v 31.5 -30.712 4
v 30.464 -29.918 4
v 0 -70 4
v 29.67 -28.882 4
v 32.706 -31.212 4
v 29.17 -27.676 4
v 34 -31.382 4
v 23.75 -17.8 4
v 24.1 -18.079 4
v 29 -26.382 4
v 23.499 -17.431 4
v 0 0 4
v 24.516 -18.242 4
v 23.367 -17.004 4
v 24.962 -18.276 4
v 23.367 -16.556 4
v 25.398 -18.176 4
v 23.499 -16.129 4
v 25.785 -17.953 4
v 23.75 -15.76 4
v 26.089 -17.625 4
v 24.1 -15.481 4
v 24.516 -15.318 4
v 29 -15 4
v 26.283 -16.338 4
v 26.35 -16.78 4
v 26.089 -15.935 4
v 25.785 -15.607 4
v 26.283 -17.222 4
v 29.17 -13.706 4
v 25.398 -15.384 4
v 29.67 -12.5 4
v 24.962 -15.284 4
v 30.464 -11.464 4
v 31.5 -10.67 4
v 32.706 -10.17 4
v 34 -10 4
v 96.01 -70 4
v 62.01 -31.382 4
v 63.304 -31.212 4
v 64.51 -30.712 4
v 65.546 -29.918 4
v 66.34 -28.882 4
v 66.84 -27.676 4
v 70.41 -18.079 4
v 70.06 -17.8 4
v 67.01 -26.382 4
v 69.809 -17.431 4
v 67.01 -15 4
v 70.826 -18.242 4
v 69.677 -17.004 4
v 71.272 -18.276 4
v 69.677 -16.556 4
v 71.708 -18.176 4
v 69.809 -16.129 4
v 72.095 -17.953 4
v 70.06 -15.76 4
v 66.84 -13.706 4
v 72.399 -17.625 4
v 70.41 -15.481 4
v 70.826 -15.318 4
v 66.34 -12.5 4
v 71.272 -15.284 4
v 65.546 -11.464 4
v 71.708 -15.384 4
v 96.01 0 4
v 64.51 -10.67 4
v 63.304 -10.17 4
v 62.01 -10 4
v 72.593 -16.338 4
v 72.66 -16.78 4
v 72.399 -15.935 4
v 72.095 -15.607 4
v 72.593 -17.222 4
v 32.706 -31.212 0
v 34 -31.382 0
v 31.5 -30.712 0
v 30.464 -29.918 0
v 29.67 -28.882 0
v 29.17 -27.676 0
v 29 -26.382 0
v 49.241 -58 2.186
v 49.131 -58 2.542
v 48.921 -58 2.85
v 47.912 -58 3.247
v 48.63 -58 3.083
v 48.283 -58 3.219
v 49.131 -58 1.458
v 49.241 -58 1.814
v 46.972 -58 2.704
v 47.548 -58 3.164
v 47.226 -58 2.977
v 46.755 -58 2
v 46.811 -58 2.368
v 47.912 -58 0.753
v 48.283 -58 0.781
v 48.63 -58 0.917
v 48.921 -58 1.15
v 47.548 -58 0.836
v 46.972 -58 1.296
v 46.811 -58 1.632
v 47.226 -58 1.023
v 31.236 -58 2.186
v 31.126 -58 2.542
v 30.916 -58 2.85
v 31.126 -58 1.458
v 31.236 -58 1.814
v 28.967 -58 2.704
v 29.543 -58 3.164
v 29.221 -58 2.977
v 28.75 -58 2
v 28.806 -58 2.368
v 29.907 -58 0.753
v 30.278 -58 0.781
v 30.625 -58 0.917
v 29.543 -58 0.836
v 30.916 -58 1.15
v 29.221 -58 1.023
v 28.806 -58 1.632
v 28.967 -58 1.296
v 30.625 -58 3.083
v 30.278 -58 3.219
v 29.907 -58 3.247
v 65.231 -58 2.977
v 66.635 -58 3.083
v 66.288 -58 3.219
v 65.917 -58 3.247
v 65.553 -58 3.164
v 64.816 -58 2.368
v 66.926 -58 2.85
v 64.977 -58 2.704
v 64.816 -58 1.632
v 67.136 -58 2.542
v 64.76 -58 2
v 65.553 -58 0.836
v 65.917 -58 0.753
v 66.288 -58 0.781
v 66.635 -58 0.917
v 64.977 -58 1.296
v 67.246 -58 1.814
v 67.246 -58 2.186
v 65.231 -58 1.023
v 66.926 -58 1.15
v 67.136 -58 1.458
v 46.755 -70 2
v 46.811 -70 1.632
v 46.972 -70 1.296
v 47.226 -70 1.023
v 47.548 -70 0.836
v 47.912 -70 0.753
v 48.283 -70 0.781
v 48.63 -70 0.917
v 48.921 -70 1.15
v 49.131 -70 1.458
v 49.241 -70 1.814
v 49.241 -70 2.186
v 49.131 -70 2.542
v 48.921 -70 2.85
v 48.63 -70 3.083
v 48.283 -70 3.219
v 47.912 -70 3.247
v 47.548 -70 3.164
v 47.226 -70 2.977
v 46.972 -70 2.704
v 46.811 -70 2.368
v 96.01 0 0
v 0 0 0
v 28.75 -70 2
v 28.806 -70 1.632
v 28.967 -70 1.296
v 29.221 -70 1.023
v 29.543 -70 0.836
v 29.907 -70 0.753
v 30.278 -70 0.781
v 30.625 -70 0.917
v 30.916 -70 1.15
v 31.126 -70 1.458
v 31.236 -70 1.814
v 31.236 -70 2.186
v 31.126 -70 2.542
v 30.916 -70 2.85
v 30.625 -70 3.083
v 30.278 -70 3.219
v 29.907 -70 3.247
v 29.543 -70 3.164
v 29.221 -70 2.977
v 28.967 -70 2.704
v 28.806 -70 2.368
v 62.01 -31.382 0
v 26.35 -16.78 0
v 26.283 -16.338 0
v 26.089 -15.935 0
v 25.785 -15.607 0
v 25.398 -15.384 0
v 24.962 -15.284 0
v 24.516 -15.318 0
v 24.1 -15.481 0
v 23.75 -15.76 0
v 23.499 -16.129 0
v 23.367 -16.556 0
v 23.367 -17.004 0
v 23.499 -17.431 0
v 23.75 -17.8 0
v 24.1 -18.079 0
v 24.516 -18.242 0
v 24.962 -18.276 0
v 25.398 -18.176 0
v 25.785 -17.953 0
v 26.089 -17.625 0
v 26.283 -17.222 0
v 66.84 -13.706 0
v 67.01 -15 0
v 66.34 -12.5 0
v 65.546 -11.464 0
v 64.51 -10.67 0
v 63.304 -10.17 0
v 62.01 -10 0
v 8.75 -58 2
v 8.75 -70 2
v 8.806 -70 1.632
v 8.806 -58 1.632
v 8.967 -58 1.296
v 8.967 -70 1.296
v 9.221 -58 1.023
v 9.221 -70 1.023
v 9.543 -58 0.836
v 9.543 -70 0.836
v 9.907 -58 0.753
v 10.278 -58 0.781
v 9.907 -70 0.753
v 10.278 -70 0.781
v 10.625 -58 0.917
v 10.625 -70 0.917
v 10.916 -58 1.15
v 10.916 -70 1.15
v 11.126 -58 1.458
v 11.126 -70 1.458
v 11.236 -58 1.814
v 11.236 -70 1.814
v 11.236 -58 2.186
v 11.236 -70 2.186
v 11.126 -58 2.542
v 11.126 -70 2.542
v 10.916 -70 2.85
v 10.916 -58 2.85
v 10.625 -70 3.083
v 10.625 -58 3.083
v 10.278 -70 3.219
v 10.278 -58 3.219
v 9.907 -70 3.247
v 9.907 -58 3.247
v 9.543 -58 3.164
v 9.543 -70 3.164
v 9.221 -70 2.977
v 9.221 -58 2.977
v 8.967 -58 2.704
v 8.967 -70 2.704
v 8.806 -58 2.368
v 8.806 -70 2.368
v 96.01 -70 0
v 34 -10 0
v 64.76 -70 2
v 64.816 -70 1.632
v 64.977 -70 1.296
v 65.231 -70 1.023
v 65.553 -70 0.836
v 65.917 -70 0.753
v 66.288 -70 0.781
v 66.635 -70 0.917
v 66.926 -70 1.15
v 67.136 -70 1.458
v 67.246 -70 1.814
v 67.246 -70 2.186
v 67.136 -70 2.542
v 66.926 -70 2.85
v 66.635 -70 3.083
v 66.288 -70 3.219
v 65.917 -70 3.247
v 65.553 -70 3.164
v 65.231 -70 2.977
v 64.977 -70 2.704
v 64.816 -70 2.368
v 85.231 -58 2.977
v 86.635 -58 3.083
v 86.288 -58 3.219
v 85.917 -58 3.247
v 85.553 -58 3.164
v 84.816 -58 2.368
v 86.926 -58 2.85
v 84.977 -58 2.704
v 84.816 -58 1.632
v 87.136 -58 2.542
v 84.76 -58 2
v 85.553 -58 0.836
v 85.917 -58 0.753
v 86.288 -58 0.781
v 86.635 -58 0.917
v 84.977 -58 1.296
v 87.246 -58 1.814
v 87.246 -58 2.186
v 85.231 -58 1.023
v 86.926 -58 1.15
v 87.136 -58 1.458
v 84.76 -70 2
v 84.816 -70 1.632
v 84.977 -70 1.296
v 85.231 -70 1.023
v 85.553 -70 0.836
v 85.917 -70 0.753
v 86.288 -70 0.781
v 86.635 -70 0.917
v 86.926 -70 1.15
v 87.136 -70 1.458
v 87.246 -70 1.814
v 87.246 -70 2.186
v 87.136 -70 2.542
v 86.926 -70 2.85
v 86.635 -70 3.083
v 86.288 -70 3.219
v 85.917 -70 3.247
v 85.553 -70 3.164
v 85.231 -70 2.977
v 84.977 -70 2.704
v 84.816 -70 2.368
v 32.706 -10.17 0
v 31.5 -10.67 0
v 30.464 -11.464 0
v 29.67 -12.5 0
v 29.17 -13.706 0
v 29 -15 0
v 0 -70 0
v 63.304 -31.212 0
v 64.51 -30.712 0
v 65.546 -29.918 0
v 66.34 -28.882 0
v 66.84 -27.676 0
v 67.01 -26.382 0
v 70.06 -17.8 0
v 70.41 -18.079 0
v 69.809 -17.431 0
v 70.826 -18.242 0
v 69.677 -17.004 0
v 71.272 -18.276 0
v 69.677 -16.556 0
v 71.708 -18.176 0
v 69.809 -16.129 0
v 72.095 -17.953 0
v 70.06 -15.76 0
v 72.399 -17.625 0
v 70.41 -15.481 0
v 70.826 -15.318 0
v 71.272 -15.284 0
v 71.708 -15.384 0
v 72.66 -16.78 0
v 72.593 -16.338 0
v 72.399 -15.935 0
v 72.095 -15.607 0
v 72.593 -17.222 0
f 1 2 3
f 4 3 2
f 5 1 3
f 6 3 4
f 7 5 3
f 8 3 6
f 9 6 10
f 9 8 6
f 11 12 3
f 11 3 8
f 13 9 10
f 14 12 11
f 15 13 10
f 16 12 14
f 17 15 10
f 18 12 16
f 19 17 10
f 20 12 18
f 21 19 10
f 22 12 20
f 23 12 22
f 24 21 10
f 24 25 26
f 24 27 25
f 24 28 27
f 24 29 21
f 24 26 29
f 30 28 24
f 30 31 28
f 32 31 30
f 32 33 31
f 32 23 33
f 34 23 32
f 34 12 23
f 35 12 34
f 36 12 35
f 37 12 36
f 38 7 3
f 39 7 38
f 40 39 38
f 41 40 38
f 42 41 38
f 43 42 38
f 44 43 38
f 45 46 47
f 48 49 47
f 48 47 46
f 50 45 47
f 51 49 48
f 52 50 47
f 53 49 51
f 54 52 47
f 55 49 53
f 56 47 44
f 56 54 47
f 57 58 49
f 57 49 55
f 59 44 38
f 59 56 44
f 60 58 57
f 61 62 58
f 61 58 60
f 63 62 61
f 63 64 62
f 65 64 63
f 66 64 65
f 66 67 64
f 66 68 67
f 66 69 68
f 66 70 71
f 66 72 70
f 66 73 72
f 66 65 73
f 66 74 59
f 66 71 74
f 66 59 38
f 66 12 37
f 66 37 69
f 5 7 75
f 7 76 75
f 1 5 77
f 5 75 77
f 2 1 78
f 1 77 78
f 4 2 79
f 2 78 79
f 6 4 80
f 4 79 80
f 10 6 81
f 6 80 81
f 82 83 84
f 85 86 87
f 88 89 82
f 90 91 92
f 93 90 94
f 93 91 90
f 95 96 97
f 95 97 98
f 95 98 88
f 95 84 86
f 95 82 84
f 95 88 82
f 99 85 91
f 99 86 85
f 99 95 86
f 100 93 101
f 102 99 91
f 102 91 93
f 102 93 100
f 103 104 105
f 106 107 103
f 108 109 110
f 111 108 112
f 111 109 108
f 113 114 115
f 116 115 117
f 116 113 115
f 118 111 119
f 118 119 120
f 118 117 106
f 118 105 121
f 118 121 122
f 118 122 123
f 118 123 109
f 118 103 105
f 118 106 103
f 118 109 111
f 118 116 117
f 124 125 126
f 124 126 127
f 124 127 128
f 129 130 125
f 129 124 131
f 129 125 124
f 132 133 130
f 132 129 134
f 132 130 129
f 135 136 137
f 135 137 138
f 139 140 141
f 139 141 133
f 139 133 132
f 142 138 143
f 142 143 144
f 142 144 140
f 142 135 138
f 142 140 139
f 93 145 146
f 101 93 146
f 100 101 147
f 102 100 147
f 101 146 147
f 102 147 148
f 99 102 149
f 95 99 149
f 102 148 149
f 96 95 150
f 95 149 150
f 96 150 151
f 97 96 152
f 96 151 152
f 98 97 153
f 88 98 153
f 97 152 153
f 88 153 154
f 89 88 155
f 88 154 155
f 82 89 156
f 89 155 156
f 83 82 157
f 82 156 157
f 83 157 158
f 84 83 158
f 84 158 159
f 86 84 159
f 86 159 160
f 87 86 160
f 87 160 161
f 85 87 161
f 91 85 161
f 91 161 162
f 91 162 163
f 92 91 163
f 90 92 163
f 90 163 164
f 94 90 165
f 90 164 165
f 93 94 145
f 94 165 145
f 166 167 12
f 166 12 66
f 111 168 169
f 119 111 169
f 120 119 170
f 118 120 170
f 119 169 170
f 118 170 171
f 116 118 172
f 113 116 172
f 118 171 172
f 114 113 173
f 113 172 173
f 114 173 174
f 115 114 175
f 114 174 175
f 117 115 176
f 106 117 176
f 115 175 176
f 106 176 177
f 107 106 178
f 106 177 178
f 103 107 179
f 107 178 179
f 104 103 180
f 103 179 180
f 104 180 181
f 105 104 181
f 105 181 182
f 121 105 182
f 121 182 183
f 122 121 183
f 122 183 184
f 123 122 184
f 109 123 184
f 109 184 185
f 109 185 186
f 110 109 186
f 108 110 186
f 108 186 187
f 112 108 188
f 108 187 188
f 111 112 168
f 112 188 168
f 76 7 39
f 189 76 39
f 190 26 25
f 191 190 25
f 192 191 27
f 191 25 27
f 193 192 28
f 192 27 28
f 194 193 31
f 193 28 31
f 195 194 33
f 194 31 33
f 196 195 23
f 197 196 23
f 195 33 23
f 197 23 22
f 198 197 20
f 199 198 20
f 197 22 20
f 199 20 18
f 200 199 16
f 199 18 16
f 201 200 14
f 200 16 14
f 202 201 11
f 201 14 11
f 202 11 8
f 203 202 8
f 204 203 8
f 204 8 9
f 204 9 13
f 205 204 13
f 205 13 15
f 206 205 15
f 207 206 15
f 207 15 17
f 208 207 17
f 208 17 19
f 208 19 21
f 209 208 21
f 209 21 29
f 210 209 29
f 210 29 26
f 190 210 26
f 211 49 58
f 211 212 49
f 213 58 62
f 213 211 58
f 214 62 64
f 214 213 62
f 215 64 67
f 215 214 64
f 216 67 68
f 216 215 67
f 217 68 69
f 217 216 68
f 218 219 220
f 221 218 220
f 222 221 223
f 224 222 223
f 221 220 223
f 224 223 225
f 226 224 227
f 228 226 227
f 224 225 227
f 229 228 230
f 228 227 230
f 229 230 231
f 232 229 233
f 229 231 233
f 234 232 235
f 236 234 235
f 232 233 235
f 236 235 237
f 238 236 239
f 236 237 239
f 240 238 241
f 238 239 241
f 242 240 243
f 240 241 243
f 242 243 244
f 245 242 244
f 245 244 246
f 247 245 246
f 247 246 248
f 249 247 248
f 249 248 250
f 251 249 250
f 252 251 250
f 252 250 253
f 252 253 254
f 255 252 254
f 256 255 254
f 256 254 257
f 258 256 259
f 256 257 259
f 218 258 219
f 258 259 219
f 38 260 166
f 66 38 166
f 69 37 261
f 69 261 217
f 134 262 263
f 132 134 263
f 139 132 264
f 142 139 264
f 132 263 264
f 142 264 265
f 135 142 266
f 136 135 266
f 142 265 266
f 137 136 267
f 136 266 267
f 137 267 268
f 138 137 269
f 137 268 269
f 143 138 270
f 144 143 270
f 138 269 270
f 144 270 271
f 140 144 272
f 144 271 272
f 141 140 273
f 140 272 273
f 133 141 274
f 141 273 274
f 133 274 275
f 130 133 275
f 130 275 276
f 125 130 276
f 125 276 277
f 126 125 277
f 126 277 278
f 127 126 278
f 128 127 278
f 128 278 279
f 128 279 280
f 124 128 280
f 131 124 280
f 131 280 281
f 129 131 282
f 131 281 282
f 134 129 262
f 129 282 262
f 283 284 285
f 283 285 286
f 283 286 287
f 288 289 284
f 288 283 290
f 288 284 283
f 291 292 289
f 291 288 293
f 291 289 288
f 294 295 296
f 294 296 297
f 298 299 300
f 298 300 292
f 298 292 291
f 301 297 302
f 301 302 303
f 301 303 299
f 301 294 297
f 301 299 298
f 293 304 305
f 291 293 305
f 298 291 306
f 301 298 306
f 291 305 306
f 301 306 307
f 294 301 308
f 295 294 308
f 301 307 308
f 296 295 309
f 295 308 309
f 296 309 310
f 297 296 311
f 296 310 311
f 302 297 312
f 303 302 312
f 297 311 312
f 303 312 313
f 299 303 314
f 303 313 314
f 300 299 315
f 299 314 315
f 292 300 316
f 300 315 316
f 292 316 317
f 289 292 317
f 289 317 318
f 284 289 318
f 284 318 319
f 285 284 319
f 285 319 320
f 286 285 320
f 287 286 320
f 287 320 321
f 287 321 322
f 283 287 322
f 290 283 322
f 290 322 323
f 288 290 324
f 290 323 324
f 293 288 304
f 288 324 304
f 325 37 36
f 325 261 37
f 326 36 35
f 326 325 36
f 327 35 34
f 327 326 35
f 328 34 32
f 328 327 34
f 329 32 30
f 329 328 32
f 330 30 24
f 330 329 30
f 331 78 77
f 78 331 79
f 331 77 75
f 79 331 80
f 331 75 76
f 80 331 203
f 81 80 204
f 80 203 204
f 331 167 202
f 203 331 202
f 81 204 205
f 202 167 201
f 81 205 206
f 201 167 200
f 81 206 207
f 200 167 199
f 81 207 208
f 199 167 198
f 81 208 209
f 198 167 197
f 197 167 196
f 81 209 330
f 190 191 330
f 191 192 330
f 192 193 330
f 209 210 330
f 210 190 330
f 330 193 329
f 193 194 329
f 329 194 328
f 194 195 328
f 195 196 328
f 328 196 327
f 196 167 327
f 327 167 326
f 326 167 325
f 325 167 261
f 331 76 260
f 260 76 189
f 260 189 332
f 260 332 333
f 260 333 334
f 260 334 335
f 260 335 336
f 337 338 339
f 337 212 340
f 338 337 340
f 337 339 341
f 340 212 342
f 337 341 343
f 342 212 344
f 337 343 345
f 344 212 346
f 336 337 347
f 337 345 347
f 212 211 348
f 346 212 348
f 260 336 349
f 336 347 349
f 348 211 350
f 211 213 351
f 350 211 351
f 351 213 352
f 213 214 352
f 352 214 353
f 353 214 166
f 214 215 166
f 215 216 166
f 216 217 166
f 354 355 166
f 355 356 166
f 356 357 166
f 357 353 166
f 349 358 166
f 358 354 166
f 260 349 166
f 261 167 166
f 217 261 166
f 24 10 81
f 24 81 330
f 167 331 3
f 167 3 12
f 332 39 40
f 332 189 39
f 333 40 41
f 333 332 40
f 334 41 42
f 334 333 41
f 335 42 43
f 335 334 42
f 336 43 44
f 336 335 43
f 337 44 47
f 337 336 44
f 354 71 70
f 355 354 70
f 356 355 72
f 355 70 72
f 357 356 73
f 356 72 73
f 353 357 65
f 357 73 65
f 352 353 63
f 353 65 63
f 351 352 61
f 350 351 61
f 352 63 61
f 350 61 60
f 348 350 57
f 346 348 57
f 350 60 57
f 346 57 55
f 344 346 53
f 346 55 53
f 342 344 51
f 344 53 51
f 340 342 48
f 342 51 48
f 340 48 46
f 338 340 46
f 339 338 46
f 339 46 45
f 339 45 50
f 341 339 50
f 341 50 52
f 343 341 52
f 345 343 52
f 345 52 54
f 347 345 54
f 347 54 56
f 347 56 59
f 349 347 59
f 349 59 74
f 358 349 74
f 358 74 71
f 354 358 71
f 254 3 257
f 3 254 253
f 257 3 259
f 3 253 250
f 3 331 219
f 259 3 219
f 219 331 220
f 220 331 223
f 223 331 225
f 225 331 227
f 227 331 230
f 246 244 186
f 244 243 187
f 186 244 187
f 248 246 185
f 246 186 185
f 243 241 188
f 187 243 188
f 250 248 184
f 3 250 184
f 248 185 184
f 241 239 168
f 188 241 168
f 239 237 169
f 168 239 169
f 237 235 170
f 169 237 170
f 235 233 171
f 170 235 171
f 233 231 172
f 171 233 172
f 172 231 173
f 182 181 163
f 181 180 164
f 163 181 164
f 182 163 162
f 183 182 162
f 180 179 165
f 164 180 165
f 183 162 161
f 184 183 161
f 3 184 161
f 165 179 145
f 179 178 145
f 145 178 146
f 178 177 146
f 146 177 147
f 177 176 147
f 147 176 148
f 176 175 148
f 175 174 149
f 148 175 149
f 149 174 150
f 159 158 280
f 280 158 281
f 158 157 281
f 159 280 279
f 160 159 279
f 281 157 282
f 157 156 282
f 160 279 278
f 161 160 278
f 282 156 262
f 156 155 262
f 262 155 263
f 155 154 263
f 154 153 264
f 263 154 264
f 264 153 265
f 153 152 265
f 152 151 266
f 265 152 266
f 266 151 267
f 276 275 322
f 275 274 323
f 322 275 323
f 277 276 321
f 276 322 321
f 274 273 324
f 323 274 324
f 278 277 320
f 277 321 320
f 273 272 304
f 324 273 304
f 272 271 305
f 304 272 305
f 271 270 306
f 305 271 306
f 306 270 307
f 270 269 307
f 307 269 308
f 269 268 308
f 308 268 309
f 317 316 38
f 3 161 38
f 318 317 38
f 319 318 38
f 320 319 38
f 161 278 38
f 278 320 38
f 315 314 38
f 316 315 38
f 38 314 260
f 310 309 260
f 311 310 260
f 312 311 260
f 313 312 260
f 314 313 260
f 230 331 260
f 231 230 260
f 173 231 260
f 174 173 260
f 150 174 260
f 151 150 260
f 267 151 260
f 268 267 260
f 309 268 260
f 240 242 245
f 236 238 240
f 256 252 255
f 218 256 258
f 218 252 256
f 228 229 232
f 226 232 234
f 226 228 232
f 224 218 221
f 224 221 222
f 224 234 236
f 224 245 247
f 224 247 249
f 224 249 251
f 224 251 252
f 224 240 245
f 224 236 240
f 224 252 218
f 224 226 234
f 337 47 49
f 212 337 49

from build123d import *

# Parameters (mm, degrees)
ESBO_O1_W                = 96.01
ESBO_O1_H                = 70
RESSALTO_EXTRUS_O1_DEPTH = 4
ESBO_O2_R                = 1.25
CORTE_EXTRUS_O1_DEPTH    = 12
ESBO_O3_R                = 1.5
ESBO_O3_W                = 38.01
ESBO_O3_H                = 21.381971147
CORTE_EXTRUS_O2_DEPTH    = 10
FILETE1_R                = 5


with BuildPart() as part:
    # Esboço1 → Ressalto-extrusão1 (new body)
    with BuildSketch(Plane.XY):
        with Locations((48.005, -35)):
            Rectangle(ESBO_O1_W, ESBO_O1_H)
    extrude(amount=RESSALTO_EXTRUS_O1_DEPTH)

    # Esboço2 → Corte-extrusão1 (cut)
    with BuildSketch(Plane(origin=(0, -70, 0), x_dir=(-1, 0, 0), z_dir=(0, -1, 0))):
        with Locations((-48.005, -2)):
            Circle(ESBO_O2_R)
        with Locations((-10, -2)):
            Circle(ESBO_O2_R)
        with Locations((-30, -2)):
            Circle(ESBO_O2_R)
        with Locations((-66.01, -2)):
            Circle(ESBO_O2_R)
        with Locations((-86.01, -2)):
            Circle(ESBO_O2_R)
    extrude(amount=-CORTE_EXTRUS_O1_DEPTH, mode=Mode.SUBTRACT)

    # Esboço3 → Corte-extrusão2 (cut)
    with BuildSketch(Plane.XY.offset(4)):
        with Locations((24.85, -16.78)):
            Circle(ESBO_O3_R)
        with Locations((71.16, -16.78)):
            Circle(ESBO_O3_R)
        with Locations((48.005, -20.690985574)):
            Rectangle(ESBO_O3_W, ESBO_O3_H)
    extrude(amount=-CORTE_EXTRUS_O2_DEPTH, mode=Mode.SUBTRACT)

    # Filete1
    filete1_edges = [part.edges().sort_by_distance(p)[0] for p in [
        (29, -31.381971147, 2),
        (29, -10, 2),
        (67.01, -10, 2),
        (67.01, -31.381971147, 2),
    ]]
    fillet(filete1_edges, radius=FILETE1_R)


solid = part.part
